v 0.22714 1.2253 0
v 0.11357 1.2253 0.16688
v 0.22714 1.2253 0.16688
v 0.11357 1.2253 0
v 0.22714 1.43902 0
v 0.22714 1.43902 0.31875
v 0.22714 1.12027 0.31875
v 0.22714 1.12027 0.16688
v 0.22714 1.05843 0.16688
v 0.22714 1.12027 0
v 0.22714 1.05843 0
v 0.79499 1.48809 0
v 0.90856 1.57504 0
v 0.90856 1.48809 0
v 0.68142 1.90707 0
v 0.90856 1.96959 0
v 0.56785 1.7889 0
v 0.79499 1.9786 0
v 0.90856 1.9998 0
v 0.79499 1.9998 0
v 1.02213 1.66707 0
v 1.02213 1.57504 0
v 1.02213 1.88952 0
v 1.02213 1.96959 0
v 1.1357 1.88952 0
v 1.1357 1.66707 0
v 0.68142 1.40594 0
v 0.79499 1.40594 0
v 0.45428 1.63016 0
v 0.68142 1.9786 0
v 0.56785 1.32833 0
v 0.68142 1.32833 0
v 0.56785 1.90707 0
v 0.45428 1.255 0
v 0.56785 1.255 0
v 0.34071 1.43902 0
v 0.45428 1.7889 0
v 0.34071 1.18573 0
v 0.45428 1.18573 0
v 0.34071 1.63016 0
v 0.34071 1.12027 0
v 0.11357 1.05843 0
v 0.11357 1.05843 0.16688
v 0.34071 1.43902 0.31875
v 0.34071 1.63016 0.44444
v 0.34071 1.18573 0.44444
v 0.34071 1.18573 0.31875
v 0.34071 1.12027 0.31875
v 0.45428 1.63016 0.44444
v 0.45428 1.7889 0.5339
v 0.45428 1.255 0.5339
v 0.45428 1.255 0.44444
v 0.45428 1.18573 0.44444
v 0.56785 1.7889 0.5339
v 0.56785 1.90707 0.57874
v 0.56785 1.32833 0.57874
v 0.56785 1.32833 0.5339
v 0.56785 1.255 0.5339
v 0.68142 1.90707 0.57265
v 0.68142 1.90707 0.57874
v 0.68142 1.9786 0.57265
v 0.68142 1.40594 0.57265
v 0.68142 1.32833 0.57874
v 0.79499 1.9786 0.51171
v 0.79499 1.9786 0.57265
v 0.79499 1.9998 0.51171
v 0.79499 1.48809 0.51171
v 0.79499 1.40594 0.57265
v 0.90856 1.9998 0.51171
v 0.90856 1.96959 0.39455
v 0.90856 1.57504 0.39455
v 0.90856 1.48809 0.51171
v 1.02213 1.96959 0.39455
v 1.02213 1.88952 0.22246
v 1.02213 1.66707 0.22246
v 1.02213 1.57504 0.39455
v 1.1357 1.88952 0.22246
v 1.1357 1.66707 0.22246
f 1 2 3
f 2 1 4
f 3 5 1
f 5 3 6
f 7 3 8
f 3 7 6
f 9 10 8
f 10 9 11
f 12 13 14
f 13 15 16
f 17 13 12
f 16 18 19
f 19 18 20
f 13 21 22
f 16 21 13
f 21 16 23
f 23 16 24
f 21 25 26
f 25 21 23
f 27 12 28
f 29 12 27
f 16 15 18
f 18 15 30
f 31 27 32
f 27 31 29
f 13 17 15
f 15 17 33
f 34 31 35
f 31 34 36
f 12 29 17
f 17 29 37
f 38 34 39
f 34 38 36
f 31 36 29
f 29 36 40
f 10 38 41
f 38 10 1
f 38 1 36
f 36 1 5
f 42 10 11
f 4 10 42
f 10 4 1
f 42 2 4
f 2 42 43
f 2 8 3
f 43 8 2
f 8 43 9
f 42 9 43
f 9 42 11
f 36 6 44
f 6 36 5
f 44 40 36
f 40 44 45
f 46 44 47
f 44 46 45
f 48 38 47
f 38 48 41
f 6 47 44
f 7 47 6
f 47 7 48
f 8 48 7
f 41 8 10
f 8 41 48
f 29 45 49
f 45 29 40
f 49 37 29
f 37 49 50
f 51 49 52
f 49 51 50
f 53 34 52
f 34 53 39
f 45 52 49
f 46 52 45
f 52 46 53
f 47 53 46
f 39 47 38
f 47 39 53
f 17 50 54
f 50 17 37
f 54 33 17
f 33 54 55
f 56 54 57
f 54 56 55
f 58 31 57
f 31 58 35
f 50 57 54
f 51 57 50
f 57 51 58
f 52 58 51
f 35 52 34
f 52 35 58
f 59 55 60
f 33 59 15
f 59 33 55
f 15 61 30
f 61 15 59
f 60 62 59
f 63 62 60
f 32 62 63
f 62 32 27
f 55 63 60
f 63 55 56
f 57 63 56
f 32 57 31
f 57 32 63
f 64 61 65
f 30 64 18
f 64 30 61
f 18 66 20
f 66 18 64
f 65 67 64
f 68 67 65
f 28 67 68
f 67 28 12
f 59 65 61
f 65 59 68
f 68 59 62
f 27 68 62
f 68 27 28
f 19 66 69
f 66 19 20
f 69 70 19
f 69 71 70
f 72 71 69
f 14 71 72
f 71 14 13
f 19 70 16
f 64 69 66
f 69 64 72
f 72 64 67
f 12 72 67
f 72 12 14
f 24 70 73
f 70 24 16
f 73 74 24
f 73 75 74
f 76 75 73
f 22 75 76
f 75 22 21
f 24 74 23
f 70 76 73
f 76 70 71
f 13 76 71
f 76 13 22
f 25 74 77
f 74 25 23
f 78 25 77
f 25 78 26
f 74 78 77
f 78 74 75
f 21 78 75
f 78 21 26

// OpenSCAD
$fn = 100;

// Functions
//function f(x) = sqrt(1 - pow(x,2));
//function g(x) = -f(x);
//a = -1;
//b = 1;
//steps = 10;

// function for curves
function f(x) = 1+sin(2*x*180/3.14);
function g(x) = exp(x/2);
a = 0;
b = 1.1357;
steps = 10;

semi_circles(a,b,steps);

// Don't edit below this line
// -----------------------------------------------------------------------------
// -----------------------------------------------------------------------------
// -----------------------------------------------------------------------------

module semi_circles(a = -1, b = 1, steps = 10) {

    step_size = (b-a)/steps;
    
    union() {
        for (x = [a:step_size:b-step_size]) {
            d = f(x)-g(x);
            
            translate([step_size+x,d/2+g(x),0])
            rotate([0,-90,0])
            linear_extrude(step_size)
            translate([d/2,0,0])square(d,center = true);
        }
    }
}
